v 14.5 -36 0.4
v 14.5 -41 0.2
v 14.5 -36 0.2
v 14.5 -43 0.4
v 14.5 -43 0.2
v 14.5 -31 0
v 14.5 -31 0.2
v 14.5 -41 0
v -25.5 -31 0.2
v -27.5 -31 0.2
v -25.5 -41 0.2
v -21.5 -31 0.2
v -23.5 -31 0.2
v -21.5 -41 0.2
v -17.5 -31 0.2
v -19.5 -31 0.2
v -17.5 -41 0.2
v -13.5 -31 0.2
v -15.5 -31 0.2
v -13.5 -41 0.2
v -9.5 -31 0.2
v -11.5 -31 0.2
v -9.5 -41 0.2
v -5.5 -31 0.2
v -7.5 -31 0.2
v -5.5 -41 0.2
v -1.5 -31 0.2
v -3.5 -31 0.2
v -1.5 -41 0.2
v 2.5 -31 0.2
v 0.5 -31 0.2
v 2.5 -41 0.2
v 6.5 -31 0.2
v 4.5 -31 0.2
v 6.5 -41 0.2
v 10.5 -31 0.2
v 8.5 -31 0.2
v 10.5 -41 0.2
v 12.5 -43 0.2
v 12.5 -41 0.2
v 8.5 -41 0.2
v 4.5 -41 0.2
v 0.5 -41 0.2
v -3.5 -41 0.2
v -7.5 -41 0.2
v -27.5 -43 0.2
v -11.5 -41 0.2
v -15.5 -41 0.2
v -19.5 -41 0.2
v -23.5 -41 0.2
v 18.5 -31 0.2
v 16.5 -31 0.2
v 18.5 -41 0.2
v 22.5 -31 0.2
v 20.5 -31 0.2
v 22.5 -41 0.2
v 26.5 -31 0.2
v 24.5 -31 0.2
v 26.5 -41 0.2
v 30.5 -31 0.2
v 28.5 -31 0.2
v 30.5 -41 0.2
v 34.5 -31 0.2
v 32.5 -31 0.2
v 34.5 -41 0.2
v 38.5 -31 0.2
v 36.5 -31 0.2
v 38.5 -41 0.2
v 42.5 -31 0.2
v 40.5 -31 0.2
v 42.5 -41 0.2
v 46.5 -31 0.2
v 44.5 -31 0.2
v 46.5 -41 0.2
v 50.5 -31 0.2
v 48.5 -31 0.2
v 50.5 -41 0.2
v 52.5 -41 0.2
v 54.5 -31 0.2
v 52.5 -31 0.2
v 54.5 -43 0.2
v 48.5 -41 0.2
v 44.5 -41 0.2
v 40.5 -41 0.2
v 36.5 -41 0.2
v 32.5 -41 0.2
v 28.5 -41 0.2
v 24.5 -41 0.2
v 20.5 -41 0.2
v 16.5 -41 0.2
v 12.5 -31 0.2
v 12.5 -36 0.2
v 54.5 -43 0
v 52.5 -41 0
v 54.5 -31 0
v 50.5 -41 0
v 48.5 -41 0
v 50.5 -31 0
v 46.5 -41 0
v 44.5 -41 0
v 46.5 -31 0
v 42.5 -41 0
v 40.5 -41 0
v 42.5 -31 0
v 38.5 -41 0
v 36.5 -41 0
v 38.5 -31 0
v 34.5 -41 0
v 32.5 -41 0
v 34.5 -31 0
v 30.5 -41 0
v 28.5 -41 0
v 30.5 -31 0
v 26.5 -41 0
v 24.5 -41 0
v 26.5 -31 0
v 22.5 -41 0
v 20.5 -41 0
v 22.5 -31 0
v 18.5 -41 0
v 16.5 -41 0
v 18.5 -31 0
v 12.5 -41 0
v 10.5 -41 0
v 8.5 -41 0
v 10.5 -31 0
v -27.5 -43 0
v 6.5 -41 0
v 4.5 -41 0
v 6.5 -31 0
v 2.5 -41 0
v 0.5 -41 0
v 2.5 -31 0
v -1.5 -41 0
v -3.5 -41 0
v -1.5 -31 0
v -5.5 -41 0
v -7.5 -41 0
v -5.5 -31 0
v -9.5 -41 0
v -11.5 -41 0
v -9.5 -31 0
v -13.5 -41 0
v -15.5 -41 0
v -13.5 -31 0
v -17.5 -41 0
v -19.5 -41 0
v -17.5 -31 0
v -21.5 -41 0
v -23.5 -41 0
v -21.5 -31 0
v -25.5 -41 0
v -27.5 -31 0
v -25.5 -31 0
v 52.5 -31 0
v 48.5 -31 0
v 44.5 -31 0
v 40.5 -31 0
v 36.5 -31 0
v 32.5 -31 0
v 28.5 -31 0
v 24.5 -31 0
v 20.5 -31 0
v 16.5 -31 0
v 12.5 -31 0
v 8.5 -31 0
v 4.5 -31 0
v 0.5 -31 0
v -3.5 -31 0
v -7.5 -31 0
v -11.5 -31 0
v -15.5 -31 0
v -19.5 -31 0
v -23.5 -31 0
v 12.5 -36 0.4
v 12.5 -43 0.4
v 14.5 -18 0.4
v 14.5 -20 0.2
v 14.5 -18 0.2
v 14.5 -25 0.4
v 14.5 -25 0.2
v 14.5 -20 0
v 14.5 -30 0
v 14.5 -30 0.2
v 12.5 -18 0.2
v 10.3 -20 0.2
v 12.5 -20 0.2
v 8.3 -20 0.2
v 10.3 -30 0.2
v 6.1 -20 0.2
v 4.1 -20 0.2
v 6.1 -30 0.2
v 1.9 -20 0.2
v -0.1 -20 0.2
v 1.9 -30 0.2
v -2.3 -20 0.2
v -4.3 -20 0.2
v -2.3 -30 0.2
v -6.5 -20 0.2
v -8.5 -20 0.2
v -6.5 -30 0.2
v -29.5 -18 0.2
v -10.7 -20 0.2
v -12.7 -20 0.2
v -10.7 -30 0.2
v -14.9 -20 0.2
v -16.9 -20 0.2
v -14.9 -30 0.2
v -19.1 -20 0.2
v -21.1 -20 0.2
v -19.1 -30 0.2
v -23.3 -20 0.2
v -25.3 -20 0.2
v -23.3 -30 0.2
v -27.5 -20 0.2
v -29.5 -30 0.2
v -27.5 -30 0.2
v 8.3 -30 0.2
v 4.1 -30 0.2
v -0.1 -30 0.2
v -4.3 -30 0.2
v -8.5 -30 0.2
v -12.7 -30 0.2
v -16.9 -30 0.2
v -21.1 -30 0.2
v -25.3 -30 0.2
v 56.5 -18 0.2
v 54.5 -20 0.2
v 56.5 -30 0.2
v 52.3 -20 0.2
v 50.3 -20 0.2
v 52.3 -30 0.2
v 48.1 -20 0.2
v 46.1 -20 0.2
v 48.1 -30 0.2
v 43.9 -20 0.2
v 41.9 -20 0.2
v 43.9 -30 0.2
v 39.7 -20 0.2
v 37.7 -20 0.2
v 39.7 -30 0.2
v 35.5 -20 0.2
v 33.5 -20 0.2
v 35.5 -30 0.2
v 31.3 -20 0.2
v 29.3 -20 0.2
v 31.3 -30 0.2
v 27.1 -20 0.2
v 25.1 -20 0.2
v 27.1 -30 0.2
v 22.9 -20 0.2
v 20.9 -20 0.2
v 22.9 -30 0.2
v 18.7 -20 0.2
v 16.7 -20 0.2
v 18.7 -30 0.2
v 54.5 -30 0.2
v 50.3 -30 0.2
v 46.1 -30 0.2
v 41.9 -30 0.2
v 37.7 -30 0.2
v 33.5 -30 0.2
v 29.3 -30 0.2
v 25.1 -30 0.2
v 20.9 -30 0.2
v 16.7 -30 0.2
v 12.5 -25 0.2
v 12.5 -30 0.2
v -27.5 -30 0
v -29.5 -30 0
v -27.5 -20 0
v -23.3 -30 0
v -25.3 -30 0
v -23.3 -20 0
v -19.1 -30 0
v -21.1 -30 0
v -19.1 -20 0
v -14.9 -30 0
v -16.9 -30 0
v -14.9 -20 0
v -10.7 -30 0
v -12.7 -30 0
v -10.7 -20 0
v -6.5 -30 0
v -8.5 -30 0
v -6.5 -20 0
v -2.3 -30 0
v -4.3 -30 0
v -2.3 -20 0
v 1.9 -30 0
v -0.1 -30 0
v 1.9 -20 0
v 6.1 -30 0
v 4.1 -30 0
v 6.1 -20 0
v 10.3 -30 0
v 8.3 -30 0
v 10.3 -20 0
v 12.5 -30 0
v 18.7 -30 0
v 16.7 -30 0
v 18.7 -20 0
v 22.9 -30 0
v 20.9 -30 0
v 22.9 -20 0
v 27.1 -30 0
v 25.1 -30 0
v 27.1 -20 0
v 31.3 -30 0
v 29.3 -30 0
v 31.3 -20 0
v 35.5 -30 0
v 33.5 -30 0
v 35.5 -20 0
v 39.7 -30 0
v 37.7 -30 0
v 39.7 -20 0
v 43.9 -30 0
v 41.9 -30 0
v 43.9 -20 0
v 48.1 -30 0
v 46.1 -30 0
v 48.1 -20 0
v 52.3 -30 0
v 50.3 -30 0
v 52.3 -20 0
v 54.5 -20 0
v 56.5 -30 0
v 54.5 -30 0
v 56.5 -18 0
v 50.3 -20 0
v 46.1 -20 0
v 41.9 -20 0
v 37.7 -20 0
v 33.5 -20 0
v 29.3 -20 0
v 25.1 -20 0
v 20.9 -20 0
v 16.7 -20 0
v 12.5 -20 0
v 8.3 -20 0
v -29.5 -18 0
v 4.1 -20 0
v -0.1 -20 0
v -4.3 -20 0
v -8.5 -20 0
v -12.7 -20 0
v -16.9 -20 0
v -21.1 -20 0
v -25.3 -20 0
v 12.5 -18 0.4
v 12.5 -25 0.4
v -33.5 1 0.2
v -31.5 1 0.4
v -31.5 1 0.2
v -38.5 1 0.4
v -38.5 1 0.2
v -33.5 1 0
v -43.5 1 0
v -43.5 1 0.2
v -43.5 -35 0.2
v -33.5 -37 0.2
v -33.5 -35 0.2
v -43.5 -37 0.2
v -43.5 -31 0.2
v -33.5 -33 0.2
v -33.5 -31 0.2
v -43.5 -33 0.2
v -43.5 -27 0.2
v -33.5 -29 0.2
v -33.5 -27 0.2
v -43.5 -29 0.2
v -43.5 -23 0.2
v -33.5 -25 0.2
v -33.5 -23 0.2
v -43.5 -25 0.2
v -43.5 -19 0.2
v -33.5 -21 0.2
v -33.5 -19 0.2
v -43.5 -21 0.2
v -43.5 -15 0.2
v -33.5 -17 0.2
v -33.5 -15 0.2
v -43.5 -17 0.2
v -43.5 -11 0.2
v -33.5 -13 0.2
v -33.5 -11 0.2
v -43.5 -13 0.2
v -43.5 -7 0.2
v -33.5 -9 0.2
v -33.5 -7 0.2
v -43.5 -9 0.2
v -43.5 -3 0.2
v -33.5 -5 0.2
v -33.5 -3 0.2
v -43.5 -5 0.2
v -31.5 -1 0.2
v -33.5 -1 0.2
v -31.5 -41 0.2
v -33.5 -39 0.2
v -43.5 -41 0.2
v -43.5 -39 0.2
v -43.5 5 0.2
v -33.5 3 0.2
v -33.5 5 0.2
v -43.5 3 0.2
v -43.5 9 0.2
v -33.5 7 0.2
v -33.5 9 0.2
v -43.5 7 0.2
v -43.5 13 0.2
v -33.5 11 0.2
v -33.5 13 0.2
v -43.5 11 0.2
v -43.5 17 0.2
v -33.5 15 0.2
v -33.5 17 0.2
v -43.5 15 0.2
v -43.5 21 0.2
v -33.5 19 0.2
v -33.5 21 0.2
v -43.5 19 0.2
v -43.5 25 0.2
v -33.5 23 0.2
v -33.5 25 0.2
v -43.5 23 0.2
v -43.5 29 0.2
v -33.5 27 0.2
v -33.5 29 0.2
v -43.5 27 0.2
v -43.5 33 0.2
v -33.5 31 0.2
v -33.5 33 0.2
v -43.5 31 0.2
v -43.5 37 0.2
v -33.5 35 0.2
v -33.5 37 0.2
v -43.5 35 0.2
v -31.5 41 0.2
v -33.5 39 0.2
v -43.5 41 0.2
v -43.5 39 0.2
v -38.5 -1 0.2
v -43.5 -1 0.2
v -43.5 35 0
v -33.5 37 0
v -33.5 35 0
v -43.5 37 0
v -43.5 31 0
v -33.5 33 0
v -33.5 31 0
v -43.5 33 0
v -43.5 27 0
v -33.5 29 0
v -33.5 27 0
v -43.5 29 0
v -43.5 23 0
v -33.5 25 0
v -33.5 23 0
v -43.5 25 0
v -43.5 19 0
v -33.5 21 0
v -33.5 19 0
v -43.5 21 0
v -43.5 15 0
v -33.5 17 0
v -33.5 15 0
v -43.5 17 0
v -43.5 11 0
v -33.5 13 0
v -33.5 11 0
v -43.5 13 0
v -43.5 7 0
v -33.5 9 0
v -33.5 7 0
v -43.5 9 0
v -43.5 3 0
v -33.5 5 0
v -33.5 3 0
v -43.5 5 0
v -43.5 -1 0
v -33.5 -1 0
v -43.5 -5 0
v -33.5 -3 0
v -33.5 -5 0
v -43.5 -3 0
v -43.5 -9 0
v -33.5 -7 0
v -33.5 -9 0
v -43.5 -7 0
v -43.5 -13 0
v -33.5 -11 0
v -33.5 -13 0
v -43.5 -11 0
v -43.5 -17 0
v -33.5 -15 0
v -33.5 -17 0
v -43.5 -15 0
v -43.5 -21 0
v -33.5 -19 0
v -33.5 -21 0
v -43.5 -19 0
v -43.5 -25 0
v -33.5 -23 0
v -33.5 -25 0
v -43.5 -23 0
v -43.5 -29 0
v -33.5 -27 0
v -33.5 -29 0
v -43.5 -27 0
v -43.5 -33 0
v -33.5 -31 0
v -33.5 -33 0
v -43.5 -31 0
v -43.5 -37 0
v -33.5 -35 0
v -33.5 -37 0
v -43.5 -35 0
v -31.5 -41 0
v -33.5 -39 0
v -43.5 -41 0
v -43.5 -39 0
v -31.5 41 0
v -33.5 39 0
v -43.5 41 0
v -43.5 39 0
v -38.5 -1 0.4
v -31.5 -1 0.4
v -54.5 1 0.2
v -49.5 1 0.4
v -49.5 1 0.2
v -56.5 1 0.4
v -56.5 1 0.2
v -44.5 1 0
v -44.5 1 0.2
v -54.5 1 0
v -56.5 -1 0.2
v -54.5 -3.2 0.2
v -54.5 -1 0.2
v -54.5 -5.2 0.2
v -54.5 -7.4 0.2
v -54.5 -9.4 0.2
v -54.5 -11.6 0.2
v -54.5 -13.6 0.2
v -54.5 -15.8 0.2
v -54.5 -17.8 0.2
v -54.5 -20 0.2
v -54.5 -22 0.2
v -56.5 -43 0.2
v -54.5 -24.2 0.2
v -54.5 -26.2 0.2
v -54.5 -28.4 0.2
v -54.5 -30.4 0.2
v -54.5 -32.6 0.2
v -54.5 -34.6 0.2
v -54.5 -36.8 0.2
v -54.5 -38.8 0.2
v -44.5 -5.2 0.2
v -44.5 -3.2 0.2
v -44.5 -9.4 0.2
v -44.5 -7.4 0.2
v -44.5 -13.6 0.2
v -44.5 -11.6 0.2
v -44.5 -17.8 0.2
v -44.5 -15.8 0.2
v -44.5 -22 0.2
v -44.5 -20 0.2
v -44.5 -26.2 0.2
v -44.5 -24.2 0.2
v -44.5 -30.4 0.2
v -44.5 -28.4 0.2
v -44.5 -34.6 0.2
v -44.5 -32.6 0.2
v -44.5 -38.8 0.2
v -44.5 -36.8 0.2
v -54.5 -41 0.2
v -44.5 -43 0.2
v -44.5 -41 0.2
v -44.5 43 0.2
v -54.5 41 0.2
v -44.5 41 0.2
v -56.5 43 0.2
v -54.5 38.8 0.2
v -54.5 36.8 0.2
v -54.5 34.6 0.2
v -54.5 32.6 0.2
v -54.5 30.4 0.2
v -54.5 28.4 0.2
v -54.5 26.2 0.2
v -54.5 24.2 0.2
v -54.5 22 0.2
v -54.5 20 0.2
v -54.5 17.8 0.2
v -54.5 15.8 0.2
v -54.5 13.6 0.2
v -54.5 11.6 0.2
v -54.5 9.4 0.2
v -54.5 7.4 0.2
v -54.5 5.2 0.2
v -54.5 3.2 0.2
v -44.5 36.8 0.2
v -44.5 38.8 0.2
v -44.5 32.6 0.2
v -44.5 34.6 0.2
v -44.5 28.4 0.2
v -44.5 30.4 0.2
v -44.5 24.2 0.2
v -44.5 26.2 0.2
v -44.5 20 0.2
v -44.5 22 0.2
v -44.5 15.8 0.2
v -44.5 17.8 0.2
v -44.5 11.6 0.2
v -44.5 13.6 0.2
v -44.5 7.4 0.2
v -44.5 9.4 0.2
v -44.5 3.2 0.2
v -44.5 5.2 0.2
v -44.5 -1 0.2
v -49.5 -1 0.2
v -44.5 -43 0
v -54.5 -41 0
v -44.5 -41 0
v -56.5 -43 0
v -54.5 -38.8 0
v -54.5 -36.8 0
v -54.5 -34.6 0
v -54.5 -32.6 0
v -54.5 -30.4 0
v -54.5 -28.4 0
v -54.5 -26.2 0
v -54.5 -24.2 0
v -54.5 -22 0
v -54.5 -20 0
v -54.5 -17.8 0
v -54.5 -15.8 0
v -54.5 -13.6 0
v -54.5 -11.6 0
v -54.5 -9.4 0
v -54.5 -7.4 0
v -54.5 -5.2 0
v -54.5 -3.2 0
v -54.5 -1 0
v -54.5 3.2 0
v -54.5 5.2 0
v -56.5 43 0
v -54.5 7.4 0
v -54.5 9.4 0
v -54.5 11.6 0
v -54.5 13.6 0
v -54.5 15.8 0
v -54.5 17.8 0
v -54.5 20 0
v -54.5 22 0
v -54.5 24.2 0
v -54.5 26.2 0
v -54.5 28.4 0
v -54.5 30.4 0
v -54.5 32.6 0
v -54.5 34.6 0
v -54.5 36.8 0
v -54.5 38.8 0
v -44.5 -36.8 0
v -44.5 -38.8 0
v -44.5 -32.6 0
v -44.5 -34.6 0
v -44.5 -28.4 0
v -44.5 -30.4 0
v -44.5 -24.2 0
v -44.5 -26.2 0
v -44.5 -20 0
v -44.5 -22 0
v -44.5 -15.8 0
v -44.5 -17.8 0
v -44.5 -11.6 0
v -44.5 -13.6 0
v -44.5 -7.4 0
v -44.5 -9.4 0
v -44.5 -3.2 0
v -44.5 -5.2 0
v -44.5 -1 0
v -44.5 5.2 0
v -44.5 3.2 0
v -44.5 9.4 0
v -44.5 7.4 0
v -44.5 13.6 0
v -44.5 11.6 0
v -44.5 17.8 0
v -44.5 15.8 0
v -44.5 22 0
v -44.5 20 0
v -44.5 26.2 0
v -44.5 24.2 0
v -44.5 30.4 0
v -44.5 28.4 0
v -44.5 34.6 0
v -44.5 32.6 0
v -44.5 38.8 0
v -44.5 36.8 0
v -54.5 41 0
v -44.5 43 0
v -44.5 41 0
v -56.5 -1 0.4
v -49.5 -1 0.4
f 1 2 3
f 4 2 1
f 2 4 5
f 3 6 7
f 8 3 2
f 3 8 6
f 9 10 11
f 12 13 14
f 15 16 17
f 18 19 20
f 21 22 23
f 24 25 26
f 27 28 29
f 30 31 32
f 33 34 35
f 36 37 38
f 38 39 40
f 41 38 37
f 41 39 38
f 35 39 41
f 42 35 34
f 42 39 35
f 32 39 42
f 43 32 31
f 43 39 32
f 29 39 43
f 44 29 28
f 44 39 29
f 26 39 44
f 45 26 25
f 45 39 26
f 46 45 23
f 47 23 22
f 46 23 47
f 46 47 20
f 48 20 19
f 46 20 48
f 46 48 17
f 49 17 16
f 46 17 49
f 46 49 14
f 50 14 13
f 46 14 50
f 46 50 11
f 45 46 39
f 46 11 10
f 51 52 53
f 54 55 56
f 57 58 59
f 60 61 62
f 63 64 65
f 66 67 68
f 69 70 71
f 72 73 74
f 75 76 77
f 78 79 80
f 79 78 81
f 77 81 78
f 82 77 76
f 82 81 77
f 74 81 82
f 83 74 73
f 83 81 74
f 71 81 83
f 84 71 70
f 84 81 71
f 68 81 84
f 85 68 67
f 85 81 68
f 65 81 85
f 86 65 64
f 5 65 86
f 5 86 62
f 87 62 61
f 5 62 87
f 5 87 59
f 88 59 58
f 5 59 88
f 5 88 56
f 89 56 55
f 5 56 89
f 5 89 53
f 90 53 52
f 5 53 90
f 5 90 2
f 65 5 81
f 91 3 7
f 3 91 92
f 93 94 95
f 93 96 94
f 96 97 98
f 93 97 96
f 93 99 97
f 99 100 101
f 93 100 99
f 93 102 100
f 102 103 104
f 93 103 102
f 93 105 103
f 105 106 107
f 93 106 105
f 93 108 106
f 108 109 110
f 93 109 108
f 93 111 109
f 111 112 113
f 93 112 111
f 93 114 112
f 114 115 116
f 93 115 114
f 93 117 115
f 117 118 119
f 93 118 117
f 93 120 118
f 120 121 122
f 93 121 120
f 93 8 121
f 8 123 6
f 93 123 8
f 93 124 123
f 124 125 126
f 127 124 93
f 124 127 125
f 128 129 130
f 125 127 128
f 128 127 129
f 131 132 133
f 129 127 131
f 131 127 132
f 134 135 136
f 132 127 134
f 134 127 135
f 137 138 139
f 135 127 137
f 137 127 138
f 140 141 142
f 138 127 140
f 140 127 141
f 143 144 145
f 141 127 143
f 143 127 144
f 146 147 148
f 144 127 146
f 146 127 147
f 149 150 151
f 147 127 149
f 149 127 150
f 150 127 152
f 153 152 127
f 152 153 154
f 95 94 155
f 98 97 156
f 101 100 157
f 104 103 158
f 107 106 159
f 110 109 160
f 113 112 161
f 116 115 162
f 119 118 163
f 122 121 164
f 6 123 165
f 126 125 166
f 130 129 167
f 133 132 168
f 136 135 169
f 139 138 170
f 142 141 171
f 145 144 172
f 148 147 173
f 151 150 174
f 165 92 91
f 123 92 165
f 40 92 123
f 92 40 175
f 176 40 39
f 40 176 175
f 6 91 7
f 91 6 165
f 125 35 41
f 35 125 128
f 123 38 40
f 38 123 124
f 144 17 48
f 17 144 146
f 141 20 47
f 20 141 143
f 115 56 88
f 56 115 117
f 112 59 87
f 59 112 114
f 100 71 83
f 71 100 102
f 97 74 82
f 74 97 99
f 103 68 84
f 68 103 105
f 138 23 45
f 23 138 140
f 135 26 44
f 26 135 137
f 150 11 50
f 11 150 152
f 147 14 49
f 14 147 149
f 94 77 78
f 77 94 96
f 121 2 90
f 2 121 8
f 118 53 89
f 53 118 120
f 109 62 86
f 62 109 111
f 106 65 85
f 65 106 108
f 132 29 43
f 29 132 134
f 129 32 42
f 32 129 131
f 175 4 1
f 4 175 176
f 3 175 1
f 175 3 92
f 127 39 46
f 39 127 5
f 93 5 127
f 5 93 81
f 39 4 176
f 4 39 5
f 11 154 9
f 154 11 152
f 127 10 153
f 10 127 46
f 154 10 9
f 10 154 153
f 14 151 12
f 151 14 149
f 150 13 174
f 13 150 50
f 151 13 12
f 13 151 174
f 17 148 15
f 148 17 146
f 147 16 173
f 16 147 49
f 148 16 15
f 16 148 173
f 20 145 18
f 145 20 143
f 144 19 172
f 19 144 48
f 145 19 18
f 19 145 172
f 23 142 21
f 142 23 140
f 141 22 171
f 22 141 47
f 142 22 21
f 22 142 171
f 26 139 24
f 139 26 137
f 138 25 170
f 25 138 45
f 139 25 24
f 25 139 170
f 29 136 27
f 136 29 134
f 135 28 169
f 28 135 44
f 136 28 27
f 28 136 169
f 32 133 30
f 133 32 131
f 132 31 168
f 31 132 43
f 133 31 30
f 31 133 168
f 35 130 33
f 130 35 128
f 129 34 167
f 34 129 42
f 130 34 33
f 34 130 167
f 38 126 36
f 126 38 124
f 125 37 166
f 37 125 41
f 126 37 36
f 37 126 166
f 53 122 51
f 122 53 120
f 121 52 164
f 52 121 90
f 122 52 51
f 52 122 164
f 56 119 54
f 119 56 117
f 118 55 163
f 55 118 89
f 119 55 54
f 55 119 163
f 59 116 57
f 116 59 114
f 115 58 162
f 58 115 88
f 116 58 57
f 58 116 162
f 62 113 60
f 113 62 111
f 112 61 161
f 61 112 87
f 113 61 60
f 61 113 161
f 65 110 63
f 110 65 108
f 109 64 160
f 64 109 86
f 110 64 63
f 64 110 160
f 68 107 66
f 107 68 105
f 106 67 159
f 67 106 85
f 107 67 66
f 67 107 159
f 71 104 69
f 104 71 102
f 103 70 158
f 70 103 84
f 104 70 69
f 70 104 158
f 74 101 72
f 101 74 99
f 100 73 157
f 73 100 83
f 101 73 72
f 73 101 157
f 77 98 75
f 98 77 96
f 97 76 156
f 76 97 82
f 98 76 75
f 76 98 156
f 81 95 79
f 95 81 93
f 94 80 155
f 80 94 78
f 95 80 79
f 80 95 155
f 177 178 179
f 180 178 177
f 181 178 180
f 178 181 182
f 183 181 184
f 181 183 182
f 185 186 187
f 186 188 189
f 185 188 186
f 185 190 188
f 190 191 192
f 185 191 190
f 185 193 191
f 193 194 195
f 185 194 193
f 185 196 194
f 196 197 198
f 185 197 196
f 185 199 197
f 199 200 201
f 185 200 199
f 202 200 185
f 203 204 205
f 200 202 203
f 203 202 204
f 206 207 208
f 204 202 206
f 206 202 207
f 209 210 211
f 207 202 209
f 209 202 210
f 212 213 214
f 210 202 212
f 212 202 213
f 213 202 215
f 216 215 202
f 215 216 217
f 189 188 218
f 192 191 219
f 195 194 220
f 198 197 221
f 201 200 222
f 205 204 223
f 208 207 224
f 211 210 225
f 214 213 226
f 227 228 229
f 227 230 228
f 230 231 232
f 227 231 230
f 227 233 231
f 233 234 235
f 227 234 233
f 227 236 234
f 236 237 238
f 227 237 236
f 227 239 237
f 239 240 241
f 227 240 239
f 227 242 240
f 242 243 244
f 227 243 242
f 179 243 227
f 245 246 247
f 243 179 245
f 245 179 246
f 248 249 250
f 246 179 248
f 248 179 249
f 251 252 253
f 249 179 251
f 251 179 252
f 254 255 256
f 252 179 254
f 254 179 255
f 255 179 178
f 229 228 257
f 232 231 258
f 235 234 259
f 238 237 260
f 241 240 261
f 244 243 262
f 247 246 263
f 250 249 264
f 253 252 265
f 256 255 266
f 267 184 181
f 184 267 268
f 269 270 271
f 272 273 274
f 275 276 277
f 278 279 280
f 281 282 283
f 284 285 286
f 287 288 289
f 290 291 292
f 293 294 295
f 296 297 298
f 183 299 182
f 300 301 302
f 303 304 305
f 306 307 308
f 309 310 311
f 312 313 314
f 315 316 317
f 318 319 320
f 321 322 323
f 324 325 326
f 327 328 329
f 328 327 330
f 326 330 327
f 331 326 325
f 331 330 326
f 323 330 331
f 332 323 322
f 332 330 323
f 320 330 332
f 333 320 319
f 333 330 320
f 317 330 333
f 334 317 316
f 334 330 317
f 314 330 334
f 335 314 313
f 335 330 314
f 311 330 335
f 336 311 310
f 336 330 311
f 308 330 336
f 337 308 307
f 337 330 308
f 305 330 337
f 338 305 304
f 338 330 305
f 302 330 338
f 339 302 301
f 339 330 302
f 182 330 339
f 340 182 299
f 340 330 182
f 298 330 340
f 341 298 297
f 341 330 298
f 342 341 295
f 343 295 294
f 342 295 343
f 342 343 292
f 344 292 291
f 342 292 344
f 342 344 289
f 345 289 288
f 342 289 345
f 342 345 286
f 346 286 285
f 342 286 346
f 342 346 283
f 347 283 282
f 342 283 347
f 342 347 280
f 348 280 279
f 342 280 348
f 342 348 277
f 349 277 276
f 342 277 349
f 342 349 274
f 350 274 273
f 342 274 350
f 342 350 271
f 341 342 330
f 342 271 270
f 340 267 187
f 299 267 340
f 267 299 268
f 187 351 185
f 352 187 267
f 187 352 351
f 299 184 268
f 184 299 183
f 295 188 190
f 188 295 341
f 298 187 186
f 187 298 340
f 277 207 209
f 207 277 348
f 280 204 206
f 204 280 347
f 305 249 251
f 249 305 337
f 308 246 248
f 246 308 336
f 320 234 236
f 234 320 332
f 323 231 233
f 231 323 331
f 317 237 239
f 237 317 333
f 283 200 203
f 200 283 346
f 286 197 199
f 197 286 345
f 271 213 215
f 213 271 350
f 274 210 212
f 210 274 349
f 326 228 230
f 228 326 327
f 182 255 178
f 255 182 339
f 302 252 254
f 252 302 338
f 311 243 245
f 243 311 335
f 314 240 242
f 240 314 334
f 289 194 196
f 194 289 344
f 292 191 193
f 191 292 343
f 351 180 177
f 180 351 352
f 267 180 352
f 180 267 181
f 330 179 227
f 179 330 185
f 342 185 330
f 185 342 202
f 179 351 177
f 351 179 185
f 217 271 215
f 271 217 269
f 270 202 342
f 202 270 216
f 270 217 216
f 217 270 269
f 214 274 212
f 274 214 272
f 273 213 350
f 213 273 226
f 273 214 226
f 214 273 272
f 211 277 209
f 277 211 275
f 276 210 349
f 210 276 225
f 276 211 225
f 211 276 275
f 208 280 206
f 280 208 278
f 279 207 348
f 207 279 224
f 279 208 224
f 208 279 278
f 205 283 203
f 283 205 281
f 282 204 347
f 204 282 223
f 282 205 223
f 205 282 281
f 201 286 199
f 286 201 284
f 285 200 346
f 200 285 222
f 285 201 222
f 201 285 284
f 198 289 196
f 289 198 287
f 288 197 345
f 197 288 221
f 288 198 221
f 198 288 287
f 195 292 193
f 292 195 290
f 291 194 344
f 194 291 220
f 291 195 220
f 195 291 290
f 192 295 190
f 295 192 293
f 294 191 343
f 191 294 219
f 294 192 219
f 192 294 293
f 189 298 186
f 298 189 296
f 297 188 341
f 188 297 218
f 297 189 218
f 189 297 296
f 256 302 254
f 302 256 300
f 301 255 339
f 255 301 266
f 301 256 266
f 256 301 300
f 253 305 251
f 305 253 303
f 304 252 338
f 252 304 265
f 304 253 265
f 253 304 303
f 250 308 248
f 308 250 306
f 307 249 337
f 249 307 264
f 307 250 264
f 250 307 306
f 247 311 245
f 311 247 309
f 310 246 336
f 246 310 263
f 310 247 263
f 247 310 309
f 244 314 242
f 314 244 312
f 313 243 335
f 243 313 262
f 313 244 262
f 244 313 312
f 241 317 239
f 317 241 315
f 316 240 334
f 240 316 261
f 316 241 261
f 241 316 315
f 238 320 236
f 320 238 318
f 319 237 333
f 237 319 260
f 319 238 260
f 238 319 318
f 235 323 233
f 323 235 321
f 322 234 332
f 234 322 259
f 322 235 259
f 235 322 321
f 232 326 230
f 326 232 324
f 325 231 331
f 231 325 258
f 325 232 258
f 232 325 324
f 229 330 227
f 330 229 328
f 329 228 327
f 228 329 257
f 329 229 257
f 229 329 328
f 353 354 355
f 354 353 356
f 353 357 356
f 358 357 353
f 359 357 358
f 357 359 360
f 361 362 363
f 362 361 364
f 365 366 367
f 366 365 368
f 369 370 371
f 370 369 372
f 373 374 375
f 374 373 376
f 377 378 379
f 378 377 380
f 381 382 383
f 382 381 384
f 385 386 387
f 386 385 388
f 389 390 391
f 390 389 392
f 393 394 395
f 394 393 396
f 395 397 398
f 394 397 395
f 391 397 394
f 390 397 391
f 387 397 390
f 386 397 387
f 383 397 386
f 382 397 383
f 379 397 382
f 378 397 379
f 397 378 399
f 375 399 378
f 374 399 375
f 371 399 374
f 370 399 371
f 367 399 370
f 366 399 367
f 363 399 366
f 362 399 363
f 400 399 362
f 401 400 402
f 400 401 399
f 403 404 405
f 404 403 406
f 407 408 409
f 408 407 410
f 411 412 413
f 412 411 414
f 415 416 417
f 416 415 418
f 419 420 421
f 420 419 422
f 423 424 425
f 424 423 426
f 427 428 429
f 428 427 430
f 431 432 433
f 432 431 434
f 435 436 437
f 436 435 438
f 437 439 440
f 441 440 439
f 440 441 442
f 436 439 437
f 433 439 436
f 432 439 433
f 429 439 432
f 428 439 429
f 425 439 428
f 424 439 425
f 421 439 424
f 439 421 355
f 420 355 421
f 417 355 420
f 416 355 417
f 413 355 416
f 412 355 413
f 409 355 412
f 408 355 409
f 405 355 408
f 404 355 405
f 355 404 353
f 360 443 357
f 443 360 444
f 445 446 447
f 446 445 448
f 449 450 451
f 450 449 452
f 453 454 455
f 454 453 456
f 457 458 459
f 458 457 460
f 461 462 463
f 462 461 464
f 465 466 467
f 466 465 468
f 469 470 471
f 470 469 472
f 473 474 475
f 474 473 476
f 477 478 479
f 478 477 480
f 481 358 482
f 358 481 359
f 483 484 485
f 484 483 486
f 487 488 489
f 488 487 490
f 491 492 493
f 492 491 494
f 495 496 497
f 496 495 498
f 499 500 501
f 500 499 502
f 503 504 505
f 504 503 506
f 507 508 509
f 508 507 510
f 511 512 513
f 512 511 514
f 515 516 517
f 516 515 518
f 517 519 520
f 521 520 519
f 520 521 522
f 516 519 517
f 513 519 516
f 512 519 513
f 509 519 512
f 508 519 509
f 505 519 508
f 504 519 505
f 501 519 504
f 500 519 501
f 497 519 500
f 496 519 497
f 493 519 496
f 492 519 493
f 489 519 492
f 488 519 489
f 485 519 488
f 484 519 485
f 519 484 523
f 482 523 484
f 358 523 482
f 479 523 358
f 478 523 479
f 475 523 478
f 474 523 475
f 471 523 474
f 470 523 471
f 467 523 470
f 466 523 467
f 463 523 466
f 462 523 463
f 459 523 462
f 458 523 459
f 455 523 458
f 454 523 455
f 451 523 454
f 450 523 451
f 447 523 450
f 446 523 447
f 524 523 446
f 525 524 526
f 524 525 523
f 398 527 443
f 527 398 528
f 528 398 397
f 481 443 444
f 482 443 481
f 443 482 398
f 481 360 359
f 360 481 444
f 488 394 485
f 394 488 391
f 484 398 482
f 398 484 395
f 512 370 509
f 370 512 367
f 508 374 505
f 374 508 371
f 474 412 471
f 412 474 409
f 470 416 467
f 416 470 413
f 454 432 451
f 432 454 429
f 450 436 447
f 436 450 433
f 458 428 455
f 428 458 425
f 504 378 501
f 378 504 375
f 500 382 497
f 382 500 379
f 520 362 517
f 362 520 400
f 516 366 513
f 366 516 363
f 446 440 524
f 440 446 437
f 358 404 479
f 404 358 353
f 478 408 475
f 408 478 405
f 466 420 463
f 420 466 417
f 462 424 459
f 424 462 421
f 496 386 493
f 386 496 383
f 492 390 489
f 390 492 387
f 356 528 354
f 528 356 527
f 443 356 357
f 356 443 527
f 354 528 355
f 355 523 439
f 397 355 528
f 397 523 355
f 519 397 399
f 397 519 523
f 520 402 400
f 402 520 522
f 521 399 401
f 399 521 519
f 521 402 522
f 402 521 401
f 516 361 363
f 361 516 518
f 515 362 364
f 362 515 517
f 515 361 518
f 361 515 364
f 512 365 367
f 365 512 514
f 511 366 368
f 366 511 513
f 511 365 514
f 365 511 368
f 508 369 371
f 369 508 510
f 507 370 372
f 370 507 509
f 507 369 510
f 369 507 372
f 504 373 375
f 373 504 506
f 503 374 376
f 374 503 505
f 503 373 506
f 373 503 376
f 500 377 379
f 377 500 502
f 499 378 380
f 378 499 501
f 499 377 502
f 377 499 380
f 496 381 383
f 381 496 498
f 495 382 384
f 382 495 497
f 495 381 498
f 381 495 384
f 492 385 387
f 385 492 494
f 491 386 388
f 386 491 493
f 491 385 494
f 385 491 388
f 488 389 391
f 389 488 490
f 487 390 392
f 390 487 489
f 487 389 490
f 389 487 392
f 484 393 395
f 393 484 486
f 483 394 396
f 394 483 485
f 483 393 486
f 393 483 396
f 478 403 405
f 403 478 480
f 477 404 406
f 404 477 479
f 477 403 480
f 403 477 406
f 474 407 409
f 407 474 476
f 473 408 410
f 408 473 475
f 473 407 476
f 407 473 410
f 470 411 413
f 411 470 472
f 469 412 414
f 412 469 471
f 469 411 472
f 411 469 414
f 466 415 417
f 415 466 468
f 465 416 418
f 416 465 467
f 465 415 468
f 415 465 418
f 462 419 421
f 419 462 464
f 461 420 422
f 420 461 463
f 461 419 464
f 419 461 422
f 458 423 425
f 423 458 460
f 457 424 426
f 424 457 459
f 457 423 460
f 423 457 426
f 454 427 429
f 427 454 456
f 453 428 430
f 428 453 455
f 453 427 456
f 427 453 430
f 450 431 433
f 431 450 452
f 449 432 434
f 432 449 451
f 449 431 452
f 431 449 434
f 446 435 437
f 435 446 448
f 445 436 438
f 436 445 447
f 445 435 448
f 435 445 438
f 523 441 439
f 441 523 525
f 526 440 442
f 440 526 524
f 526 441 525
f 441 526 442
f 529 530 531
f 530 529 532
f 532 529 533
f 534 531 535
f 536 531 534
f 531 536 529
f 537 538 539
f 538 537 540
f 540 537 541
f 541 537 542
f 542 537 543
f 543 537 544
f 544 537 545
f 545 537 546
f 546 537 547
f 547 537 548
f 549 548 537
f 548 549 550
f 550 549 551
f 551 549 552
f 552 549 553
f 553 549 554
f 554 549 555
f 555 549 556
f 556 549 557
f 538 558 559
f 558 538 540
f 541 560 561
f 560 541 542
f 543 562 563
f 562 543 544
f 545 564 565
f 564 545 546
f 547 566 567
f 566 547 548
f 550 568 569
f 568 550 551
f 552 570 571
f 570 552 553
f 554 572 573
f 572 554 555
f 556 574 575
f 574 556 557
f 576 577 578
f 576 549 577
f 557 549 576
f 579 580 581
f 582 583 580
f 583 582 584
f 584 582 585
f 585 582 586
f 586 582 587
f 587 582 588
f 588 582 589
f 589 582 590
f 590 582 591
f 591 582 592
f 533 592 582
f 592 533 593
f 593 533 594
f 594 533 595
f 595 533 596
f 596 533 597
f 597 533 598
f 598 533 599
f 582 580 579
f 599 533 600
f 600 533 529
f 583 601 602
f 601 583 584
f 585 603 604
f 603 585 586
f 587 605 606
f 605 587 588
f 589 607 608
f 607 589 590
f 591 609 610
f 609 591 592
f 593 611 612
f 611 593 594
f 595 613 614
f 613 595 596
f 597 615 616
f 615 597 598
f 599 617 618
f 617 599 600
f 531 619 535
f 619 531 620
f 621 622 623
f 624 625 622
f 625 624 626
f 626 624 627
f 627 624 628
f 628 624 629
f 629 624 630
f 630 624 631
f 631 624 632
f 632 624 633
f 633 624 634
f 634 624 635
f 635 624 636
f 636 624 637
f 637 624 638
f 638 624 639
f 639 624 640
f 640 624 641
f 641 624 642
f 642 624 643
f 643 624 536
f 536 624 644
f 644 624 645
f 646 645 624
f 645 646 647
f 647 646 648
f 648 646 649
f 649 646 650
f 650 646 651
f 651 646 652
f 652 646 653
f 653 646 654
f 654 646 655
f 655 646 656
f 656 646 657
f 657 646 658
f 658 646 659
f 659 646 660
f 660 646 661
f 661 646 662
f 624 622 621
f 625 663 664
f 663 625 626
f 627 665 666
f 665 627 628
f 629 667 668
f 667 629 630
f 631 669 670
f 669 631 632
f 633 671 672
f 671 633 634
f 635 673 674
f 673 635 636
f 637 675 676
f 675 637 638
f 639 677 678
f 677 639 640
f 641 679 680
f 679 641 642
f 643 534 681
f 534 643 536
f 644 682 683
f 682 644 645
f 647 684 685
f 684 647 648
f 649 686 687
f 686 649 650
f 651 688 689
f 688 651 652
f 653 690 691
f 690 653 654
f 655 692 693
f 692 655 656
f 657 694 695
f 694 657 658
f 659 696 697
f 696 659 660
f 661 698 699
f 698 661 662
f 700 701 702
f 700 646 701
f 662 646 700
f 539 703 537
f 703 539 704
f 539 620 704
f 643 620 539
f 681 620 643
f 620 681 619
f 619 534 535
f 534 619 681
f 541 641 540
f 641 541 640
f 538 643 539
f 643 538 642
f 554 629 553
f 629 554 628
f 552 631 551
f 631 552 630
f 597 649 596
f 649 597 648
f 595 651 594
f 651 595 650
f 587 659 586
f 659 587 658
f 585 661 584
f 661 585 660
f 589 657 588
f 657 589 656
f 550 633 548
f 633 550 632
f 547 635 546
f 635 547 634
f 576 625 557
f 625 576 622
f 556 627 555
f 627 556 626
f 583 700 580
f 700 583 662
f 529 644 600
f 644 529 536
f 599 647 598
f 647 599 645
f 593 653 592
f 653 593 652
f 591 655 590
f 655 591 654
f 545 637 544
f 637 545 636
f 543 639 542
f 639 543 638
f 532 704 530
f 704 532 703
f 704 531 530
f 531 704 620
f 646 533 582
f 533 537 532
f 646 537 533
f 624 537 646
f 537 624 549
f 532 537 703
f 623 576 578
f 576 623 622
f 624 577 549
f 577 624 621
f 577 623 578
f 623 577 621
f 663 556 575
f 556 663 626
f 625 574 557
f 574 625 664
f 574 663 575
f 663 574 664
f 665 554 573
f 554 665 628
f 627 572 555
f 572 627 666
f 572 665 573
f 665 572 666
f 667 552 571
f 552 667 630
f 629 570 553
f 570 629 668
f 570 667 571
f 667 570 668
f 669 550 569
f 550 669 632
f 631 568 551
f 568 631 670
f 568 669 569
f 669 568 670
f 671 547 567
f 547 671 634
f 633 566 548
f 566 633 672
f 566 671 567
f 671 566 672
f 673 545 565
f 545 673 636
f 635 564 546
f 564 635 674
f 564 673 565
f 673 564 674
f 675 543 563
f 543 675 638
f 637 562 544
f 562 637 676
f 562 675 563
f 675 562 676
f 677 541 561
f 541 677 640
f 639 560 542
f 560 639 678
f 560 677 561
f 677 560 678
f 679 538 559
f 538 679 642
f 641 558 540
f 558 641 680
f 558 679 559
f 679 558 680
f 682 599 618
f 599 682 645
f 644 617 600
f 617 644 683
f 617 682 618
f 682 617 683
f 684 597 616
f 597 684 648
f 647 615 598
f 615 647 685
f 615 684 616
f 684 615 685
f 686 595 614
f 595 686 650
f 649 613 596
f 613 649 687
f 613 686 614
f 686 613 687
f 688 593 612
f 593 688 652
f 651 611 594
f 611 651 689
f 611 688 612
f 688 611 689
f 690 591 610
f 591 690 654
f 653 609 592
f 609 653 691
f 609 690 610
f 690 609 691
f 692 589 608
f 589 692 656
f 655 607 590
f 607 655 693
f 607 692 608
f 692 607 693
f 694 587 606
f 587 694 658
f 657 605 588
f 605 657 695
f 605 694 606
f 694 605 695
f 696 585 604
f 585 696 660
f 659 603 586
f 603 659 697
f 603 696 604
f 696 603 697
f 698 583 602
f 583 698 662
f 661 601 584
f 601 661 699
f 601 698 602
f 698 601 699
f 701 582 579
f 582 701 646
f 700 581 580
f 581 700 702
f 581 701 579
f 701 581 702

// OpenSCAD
/**
 *
 * Run:
 *
 *    openscad <file_name>.scad
 *    openscad [options] <file_name>.scad
 *
 * Options with -D <var=val>:
 * 
 *    teeth_count      number of teeth, recommended: 10 for positive offset + 10 for negative offset + 1 center = 21
 *    tooth_width      width of one single tooth
 *    tooth_height     height of teeth / comb, should be n * layer_height
 *    tooth_length     length of one single tooth
 *    teeth_gap        space in between teeth of the unscaled comb
 *    comb_clearance   comb to comb distance, should not be > (2 * tooth_width)
 *    base_height      comb base (optional), set to 0 to disable
 *    render_mode      0 ... all, 1 ... verification comb + base, 2 ... alignment comb
 *    extra_clearance  deprecated: extra clearance in case the comb pairs overlap (usually on small twidth and/or tgap)
 * 
 */

// Author : rubienr (https://github.com/rubienr)
// Source : https://github.com/rubienr/cad/blob/master/creality-ender-5-plus/printer-test-objects/nozzle-to-nozzle-offset-calibration-pattern/nozzle-to-nozzle-xy-offset-calibration-pattern.scad
// Origin : https://github.com/5axes/Calibration-Shapes/issues/15
// ------------------------------------------------------------------------------------------------------------------------

module drawComb (
    _num_teeth, 
    _teeth_gap,
    _tooth_width,
    _tooth_height,
    _tooth_length,
    _base_height,
    _render_mode) // 3 ... none, 4 ... bed only, 5 ... comb only, 6 ... all
{
  
  // base for better adhesion (optional)
  if (_base_height > 0 && (_render_mode == 4 || _render_mode == 6)) 
  {
    _comb_length = (_num_teeth - 1) * _teeth_gap + (_num_teeth + 2) * _tooth_width;
    _comb_width  =  _tooth_width + _tooth_length + 2 * _tooth_width;
    
    color("grey")
      translate ([-_tooth_width, -2*_tooth_width, 0])
        cube([_comb_length, _comb_width, _base_height]);
  }

  // comb
  if (_render_mode == 5 || _render_mode == 6) 
  {
    color_value = _render_mode == 1 ? "blue": (_render_mode == 2 ? "red" : "orange");
  
    // teeth
    for (t = [0:_num_teeth-1]) 
    {
      let (translation = [t * (_teeth_gap + _tooth_width), 0, _base_height])
      {
        translate (translation) color(color_value) cube ([_tooth_width, _tooth_length, _tooth_height], false);
        
        // center tooth mark
        if (t == (((_num_teeth - 1) / 2)))
        {
          translate (translation + [0, -_tooth_width, _tooth_height]) color(color_value) cube ([_tooth_width, _tooth_length / 2 + _tooth_width, _tooth_height]);
        }
      }
    }
    
    // comb back
    translate ([0, - _tooth_width, _base_height]) 
      color(color_value) 
        cube ([_num_teeth * _tooth_width + (_num_teeth - 1) * _teeth_gap, _tooth_width, _tooth_height], false);      
  }
}

// ------------------------------------------------------------------------------------------------------------------------

module drawCombPair(
    _teeth_count, 
    _teeth_gap,
    _tooth_width,
    _tooth_height,
    _tooth_length,
    _comb_clearance,
    _base_height,
    _render_mode) 
{
  _comb_displacement = [0, -_tooth_length - (_comb_clearance / 2), 0];
  _second_comb_teeth_displacement = _teeth_gap / ((_teeth_count - 1) / 2);
  _second_comb_teeth_gap = _teeth_gap + _second_comb_teeth_displacement;
  _second_comb_displacement = [-_teeth_gap, 0 , 0];

  // default comb
    translate(_comb_displacement)
      drawComb(_teeth_count, _teeth_gap, _tooth_width, _tooth_height, _tooth_length, _base_height,  
        _render_mode == 0 ? 6 :             // all
          (_render_mode == 2 ? 5 :          // comb only
            (_render_mode == 1 ? 4 : 3)));  // bed only

  // verification comb (stretched)
    mirror ([0,1,0]) 
      translate (_second_comb_displacement) // sync middle tooth with default comb 
        translate(_comb_displacement)
          drawComb(_teeth_count, _second_comb_teeth_gap, _tooth_width, _tooth_height, _tooth_length, _base_height, 
            _render_mode == 0 ? 6 :          // all
              (_render_mode == 1 ? 6 : 3));  // comb and bed
}

// ------------------------------------------------------------------------------------------------------------------------

module drawXYCalibrationCombs( 
    _teeth_count, 
    _teeth_gap,
    _tooth_width,
    _tooth_height,
    _tooth_length,
    _comb_clearance,
    _base_height,
    _render_mode,
    _extra_clearance) 
{
  _comb_width = _tooth_length + _tooth_width + _comb_clearance / 2;
  _t_x = [_comb_width + 2 * _tooth_width + _extra_clearance , 0, 0];
  _t_y = [0, -_comb_width + _tooth_width, 0];
  _r_y = [0, 0, 90];
  
  // X aligned comb pair
  translate(_t_x)
    drawCombPair(_teeth_count, _teeth_gap, _tooth_width, _tooth_height, _tooth_length, _comb_clearance, _base_height, _render_mode);

  // Y aligned comb pair
  translate(_t_y)
    rotate(_r_y) 
      drawCombPair(_teeth_count, _teeth_gap, _tooth_width, _tooth_height, _tooth_length, _comb_clearance, _base_height, _render_mode); 
}

// ------------------------------------------------------------------------------------------------------------------------

module draw()
{
  teeth_count    = is_undef(teeth_count)    ?  21 : teeth_count;     // number of teeth, recommended: 10 for positive offset + 10 for negative offset + 1 center = 21
  tooth_width    = is_undef(tooth_width)    ?   2 : tooth_width;     // width of one single tooth
  tooth_height   = is_undef(tooth_height)   ? 0.2 : tooth_height;    // height of teeth / comb, should be n * layer_height
  tooth_length   = is_undef(tooth_length)   ?  10 : tooth_length;    // length of one single tooth
  teeth_gap      = is_undef(teeth_gap)      ?   2 : teeth_gap;       // space in between teeth of the unscaled comb
  comb_clearance = is_undef(comb_clearance) ?   1 : comb_clearance;  // comb to comb distance, should not be > (2 * tooth_width)
  base_height    = is_undef(base_height)    ?   0 : base_height;     // comb base (optional), set to 0 to disable
  render_mode    = is_undef(render_mode)    ?   0 : render_mode;     // 0 ... all, 1 ... verification comb + base, 2 ... alignment comb; (>= 3 ... reserved for internal usage)
  
  // TODO rr - remove the need of the extra_clearance parameter: swap draw order (draw verification comb first, then align the default one)
  extra_clearance = is_undef(extra_clearance) ? 0 : extra_clearance; // extra clearance in case the comb pairs overlap (usually on small twidth and/or tgap)
  
  assert(teeth_count % 2 == 1, "An odd number of teeth is required.");
  drawXYCalibrationCombs(teeth_count, teeth_gap, tooth_width, tooth_height, tooth_length, comb_clearance, base_height, render_mode, extra_clearance);
}

// ------------------------------------------------------------------------------------------------------------------------
// Translate to center the part
translate([-44,-30.5,0]) draw();
